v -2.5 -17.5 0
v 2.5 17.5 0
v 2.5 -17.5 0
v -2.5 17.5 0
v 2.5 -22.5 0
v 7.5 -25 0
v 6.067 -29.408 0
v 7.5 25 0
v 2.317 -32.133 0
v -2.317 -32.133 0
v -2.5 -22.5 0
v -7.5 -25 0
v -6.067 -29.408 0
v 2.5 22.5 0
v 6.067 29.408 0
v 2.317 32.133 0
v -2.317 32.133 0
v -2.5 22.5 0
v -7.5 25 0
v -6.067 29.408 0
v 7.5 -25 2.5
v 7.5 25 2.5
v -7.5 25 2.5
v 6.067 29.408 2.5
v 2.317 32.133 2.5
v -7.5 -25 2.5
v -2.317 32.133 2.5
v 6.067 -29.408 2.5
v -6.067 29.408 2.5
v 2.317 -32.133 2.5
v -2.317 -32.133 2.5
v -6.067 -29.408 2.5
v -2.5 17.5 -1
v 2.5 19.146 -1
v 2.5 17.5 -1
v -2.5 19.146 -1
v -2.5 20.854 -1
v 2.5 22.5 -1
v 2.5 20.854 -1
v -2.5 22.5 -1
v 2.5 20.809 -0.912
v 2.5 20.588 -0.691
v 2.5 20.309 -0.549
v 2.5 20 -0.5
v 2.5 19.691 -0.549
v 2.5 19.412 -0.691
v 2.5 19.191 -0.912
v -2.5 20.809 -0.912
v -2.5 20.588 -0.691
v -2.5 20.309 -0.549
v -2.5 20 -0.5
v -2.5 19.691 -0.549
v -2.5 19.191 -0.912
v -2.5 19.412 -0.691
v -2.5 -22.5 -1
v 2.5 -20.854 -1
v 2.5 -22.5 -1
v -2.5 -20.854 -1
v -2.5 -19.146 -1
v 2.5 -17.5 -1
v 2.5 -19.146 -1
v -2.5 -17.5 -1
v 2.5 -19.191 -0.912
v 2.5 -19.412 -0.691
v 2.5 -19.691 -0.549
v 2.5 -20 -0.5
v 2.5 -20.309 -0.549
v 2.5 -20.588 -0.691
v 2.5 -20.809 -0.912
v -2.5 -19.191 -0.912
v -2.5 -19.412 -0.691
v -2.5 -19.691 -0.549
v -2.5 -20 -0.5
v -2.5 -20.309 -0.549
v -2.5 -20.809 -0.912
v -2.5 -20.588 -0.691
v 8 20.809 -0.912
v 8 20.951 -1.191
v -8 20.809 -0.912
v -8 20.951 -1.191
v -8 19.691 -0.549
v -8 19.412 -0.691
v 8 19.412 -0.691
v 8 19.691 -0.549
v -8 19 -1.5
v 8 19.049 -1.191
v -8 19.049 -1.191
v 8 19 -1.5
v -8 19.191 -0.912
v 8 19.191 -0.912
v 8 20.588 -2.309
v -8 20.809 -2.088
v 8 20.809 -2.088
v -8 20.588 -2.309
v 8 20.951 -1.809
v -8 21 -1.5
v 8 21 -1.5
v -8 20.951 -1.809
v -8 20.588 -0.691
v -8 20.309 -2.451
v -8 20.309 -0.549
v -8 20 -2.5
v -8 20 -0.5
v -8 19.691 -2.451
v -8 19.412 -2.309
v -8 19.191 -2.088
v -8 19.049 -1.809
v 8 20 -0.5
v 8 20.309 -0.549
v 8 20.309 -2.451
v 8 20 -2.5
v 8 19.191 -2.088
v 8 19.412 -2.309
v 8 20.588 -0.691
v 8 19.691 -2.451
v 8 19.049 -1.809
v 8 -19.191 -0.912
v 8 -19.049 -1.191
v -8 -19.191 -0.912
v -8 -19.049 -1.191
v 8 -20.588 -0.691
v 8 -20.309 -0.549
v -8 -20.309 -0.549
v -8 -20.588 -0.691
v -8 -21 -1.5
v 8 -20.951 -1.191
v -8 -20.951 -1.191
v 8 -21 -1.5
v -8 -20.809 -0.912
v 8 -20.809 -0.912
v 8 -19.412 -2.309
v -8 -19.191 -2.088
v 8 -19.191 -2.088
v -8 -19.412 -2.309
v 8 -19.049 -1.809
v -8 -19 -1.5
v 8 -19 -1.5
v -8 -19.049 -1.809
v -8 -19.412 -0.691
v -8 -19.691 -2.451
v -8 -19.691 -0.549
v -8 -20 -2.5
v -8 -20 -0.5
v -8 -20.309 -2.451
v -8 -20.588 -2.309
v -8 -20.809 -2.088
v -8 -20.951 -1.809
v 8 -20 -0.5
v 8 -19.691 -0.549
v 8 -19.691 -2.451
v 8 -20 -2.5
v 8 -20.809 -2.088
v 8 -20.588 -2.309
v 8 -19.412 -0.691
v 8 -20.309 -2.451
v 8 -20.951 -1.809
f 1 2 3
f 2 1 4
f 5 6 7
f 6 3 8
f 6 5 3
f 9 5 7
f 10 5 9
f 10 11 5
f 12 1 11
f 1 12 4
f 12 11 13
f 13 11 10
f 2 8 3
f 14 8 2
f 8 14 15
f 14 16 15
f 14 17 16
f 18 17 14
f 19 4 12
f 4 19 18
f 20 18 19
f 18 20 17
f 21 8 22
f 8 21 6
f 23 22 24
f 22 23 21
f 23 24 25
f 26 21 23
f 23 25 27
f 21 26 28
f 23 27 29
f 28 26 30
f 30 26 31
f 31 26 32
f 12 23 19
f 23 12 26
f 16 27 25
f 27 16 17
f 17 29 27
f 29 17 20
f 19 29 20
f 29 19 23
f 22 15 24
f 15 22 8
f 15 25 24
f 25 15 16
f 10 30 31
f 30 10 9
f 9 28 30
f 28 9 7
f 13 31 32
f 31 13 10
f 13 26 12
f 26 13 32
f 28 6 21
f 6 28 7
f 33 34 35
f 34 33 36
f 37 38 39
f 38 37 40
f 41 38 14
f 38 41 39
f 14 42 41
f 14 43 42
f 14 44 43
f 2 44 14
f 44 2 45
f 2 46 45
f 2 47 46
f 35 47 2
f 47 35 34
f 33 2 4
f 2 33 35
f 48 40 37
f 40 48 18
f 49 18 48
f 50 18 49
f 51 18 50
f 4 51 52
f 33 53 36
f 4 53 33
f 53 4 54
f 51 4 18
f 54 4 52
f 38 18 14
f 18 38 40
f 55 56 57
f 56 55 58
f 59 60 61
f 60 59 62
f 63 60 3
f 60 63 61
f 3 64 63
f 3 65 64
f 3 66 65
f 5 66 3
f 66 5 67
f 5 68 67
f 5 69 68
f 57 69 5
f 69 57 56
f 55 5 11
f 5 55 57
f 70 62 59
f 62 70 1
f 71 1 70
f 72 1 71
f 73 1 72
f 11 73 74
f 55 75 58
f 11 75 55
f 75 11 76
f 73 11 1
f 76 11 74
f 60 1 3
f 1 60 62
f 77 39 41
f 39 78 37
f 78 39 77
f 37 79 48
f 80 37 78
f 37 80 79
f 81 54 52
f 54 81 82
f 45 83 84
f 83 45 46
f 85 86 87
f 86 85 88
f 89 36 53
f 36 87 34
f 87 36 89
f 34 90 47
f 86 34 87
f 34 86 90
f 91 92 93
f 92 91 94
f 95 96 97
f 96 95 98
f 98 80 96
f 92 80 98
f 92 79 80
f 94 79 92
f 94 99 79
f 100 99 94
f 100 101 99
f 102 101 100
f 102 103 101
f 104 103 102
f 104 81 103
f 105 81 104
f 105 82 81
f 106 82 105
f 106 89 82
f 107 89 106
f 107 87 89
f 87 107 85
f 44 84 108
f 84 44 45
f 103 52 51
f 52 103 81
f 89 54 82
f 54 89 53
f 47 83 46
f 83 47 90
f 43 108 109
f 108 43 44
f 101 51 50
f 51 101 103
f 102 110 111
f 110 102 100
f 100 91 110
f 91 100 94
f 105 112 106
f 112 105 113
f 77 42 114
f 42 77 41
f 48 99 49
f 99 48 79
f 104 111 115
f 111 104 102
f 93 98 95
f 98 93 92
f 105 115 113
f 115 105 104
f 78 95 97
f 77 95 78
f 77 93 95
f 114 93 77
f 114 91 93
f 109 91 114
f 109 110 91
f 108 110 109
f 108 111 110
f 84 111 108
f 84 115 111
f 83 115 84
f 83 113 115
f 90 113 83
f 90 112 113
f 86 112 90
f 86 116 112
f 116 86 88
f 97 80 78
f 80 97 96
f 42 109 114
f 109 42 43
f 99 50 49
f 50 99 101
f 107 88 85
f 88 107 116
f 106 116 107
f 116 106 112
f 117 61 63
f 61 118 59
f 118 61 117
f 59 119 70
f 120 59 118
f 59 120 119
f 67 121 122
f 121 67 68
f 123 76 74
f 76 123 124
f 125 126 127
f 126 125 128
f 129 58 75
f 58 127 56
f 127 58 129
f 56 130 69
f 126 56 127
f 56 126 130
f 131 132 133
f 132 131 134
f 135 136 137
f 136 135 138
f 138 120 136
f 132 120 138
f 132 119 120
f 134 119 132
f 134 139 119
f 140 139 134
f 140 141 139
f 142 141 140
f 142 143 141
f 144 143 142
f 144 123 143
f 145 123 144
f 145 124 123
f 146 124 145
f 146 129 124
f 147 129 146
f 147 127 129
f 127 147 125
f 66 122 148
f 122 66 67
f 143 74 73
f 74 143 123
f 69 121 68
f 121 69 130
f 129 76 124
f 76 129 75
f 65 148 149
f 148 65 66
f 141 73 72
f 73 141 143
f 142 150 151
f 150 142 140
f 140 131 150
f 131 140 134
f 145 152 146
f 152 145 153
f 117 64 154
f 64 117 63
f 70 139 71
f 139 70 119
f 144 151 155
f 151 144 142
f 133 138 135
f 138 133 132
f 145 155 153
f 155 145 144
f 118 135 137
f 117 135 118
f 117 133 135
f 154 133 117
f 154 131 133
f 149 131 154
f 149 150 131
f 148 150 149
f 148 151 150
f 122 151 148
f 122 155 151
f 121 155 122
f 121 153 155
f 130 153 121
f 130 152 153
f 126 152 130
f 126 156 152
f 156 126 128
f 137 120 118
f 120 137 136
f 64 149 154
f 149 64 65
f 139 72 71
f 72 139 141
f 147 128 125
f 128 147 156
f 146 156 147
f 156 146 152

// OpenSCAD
union()
{
    linear_extrude(height = 2.5, twist = 0.0, scale = 1.0, slices = 1, center = false)
    {
        scale([15.0, 50.0])
        {
            M8();
        }
    }
    translate([0.0, 25.0, 0.0])
    {
        linear_extrude(height = 2.5, twist = 0.0, scale = 1.0, slices = 1, center = false)
        {
            intersection()
            {
                scale([15.0, 15.0])
                {
                    M24();
                }
                M33();
            }
        }
    }
    translate([0.0, -25.0, 2.5])
    {
        rotate([180.0, 0.0, 0.0])
        {
            linear_extrude(height = 2.5, twist = 0.0, scale = 1.0, slices = 1, center = false)
            {
                intersection()
                {
                    scale([15.0, 15.0])
                    {
                        M24();
                    }
                    M33();
                }
            }
        }
    }
    translate([0.0, 20.0, -1.0])
    {
        linear_extrude(height = 2.0, twist = 0.0, scale = 1.0, slices = 1, center = false)
        {
            scale([5.0, 5.0])
            {
                M8();
            }
        }
    }
    translate([0.0, -20.0, -1.0])
    {
        linear_extrude(height = 2.0, twist = 0.0, scale = 1.0, slices = 1, center = false)
        {
            scale([5.0, 5.0])
            {
                M8();
            }
        }
    }
    translate([0.0, 20.0, -1.5])
    {
        rotate([0.0, 0.0, 90.0])
        {
            rotate([0.0, 0.0, 0.0])
            {
                rotate([90.0, 0.0, 0.0])
                {
                    linear_extrude(height = 16.0, twist = 0.0, scale = 1.0, slices = 1, center = true)
                    {
                        scale([2.0, 2.0])
                        {
                            M44();
                        }
                    }
                }
            }
        }
    }
    translate([0.0, -20.0, -1.5])
    {
        rotate([0.0, 0.0, 90.0])
        {
            rotate([0.0, 0.0, 0.0])
            {
                rotate([90.0, 0.0, 0.0])
                {
                    linear_extrude(height = 16.0, twist = 0.0, scale = 1.0, slices = 1, center = true)
                    {
                        scale([2.0, 2.0])
                        {
                            M44();
                        }
                    }
                }
            }
        }
    }
}

module M33()
{
    polygon
    (
        points =
        [
            [0.0, 0.0], 
            [15.0, 0.0], 
            [13.858192987669302, 5.740251485476347], 
            [10.606601717798213, 10.606601717798211], 
            [5.740251485476348, 13.858192987669302], 
            [9.18485099360515E-16, 15.0], 
            [-5.740251485476346, 13.858192987669302], 
            [-10.606601717798211, 10.606601717798213], 
            [-13.858192987669302, 5.740251485476349], 
            [-15.0, 1.83697019872103E-15]
        ],
        paths =
        [
            [0, 1, 2, 3, 4, 5, 6, 7, 8, 9]
        ]
    );
}

module M8()
{
    polygon
    (
        points =
        [
            [-0.5, -0.5], 
            [0.5, -0.5], 
            [0.5, 0.5], 
            [-0.5, 0.5]
        ],
        paths =
        [
            [0, 1, 2, 3]
        ]
    );
}

module M24()
{
    polygon
    (
        points =
        [
            [0.5, 0.0], 
            [0.4045084971874737, 0.29389262614623657], 
            [0.15450849718747373, 0.47552825814757677], 
            [-0.15450849718747378, 0.47552825814757677], 
            [-0.40450849718747367, 0.2938926261462366], 
            [-0.5, 6.123233995736766E-17], 
            [-0.4045084971874736, -0.2938926261462367], 
            [-0.15450849718747378, -0.47552825814757677], 
            [0.15450849718747361, -0.4755282581475768], 
            [0.40450849718747367, -0.2938926261462367]
        ],
        paths =
        [
            [0, 1, 2, 3, 4, 5, 6, 7, 8, 9]
        ]
    );
}

module M44()
{
    polygon
    (
        points =
        [
            [0.5, 0.0], 
            [0.47552825814757677, 0.1545084971874737], 
            [0.4045084971874737, 0.29389262614623657], 
            [0.2938926261462365, 0.4045084971874737], 
            [0.15450849718747373, 0.47552825814757677], 
            [3.061616997868383E-17, 0.5], 
            [-0.15450849718747378, 0.47552825814757677], 
            [-0.2938926261462365, 0.4045084971874737], 
            [-0.40450849718747367, 0.2938926261462366], 
            [-0.47552825814757677, 0.15450849718747375], 
            [-0.5, 6.123233995736766E-17], 
            [-0.47552825814757677, -0.15450849718747386], 
            [-0.4045084971874736, -0.2938926261462367], 
            [-0.2938926261462366, -0.40450849718747367], 
            [-0.15450849718747378, -0.47552825814757677], 
            [-9.184850993605148E-17, -0.5], 
            [0.15450849718747361, -0.4755282581475768], 
            [0.29389262614623685, -0.4045084971874735], 
            [0.40450849718747367, -0.2938926261462367], 
            [0.47552825814757677, -0.1545084971874738]
        ],
        paths =
        [
            [0, 1, 2, 3, 4, 5, 6, 7, 8, 9, 10, 11, 12, 13, 14, 15, 16, 17, 18, 19]
        ]
    );
}
